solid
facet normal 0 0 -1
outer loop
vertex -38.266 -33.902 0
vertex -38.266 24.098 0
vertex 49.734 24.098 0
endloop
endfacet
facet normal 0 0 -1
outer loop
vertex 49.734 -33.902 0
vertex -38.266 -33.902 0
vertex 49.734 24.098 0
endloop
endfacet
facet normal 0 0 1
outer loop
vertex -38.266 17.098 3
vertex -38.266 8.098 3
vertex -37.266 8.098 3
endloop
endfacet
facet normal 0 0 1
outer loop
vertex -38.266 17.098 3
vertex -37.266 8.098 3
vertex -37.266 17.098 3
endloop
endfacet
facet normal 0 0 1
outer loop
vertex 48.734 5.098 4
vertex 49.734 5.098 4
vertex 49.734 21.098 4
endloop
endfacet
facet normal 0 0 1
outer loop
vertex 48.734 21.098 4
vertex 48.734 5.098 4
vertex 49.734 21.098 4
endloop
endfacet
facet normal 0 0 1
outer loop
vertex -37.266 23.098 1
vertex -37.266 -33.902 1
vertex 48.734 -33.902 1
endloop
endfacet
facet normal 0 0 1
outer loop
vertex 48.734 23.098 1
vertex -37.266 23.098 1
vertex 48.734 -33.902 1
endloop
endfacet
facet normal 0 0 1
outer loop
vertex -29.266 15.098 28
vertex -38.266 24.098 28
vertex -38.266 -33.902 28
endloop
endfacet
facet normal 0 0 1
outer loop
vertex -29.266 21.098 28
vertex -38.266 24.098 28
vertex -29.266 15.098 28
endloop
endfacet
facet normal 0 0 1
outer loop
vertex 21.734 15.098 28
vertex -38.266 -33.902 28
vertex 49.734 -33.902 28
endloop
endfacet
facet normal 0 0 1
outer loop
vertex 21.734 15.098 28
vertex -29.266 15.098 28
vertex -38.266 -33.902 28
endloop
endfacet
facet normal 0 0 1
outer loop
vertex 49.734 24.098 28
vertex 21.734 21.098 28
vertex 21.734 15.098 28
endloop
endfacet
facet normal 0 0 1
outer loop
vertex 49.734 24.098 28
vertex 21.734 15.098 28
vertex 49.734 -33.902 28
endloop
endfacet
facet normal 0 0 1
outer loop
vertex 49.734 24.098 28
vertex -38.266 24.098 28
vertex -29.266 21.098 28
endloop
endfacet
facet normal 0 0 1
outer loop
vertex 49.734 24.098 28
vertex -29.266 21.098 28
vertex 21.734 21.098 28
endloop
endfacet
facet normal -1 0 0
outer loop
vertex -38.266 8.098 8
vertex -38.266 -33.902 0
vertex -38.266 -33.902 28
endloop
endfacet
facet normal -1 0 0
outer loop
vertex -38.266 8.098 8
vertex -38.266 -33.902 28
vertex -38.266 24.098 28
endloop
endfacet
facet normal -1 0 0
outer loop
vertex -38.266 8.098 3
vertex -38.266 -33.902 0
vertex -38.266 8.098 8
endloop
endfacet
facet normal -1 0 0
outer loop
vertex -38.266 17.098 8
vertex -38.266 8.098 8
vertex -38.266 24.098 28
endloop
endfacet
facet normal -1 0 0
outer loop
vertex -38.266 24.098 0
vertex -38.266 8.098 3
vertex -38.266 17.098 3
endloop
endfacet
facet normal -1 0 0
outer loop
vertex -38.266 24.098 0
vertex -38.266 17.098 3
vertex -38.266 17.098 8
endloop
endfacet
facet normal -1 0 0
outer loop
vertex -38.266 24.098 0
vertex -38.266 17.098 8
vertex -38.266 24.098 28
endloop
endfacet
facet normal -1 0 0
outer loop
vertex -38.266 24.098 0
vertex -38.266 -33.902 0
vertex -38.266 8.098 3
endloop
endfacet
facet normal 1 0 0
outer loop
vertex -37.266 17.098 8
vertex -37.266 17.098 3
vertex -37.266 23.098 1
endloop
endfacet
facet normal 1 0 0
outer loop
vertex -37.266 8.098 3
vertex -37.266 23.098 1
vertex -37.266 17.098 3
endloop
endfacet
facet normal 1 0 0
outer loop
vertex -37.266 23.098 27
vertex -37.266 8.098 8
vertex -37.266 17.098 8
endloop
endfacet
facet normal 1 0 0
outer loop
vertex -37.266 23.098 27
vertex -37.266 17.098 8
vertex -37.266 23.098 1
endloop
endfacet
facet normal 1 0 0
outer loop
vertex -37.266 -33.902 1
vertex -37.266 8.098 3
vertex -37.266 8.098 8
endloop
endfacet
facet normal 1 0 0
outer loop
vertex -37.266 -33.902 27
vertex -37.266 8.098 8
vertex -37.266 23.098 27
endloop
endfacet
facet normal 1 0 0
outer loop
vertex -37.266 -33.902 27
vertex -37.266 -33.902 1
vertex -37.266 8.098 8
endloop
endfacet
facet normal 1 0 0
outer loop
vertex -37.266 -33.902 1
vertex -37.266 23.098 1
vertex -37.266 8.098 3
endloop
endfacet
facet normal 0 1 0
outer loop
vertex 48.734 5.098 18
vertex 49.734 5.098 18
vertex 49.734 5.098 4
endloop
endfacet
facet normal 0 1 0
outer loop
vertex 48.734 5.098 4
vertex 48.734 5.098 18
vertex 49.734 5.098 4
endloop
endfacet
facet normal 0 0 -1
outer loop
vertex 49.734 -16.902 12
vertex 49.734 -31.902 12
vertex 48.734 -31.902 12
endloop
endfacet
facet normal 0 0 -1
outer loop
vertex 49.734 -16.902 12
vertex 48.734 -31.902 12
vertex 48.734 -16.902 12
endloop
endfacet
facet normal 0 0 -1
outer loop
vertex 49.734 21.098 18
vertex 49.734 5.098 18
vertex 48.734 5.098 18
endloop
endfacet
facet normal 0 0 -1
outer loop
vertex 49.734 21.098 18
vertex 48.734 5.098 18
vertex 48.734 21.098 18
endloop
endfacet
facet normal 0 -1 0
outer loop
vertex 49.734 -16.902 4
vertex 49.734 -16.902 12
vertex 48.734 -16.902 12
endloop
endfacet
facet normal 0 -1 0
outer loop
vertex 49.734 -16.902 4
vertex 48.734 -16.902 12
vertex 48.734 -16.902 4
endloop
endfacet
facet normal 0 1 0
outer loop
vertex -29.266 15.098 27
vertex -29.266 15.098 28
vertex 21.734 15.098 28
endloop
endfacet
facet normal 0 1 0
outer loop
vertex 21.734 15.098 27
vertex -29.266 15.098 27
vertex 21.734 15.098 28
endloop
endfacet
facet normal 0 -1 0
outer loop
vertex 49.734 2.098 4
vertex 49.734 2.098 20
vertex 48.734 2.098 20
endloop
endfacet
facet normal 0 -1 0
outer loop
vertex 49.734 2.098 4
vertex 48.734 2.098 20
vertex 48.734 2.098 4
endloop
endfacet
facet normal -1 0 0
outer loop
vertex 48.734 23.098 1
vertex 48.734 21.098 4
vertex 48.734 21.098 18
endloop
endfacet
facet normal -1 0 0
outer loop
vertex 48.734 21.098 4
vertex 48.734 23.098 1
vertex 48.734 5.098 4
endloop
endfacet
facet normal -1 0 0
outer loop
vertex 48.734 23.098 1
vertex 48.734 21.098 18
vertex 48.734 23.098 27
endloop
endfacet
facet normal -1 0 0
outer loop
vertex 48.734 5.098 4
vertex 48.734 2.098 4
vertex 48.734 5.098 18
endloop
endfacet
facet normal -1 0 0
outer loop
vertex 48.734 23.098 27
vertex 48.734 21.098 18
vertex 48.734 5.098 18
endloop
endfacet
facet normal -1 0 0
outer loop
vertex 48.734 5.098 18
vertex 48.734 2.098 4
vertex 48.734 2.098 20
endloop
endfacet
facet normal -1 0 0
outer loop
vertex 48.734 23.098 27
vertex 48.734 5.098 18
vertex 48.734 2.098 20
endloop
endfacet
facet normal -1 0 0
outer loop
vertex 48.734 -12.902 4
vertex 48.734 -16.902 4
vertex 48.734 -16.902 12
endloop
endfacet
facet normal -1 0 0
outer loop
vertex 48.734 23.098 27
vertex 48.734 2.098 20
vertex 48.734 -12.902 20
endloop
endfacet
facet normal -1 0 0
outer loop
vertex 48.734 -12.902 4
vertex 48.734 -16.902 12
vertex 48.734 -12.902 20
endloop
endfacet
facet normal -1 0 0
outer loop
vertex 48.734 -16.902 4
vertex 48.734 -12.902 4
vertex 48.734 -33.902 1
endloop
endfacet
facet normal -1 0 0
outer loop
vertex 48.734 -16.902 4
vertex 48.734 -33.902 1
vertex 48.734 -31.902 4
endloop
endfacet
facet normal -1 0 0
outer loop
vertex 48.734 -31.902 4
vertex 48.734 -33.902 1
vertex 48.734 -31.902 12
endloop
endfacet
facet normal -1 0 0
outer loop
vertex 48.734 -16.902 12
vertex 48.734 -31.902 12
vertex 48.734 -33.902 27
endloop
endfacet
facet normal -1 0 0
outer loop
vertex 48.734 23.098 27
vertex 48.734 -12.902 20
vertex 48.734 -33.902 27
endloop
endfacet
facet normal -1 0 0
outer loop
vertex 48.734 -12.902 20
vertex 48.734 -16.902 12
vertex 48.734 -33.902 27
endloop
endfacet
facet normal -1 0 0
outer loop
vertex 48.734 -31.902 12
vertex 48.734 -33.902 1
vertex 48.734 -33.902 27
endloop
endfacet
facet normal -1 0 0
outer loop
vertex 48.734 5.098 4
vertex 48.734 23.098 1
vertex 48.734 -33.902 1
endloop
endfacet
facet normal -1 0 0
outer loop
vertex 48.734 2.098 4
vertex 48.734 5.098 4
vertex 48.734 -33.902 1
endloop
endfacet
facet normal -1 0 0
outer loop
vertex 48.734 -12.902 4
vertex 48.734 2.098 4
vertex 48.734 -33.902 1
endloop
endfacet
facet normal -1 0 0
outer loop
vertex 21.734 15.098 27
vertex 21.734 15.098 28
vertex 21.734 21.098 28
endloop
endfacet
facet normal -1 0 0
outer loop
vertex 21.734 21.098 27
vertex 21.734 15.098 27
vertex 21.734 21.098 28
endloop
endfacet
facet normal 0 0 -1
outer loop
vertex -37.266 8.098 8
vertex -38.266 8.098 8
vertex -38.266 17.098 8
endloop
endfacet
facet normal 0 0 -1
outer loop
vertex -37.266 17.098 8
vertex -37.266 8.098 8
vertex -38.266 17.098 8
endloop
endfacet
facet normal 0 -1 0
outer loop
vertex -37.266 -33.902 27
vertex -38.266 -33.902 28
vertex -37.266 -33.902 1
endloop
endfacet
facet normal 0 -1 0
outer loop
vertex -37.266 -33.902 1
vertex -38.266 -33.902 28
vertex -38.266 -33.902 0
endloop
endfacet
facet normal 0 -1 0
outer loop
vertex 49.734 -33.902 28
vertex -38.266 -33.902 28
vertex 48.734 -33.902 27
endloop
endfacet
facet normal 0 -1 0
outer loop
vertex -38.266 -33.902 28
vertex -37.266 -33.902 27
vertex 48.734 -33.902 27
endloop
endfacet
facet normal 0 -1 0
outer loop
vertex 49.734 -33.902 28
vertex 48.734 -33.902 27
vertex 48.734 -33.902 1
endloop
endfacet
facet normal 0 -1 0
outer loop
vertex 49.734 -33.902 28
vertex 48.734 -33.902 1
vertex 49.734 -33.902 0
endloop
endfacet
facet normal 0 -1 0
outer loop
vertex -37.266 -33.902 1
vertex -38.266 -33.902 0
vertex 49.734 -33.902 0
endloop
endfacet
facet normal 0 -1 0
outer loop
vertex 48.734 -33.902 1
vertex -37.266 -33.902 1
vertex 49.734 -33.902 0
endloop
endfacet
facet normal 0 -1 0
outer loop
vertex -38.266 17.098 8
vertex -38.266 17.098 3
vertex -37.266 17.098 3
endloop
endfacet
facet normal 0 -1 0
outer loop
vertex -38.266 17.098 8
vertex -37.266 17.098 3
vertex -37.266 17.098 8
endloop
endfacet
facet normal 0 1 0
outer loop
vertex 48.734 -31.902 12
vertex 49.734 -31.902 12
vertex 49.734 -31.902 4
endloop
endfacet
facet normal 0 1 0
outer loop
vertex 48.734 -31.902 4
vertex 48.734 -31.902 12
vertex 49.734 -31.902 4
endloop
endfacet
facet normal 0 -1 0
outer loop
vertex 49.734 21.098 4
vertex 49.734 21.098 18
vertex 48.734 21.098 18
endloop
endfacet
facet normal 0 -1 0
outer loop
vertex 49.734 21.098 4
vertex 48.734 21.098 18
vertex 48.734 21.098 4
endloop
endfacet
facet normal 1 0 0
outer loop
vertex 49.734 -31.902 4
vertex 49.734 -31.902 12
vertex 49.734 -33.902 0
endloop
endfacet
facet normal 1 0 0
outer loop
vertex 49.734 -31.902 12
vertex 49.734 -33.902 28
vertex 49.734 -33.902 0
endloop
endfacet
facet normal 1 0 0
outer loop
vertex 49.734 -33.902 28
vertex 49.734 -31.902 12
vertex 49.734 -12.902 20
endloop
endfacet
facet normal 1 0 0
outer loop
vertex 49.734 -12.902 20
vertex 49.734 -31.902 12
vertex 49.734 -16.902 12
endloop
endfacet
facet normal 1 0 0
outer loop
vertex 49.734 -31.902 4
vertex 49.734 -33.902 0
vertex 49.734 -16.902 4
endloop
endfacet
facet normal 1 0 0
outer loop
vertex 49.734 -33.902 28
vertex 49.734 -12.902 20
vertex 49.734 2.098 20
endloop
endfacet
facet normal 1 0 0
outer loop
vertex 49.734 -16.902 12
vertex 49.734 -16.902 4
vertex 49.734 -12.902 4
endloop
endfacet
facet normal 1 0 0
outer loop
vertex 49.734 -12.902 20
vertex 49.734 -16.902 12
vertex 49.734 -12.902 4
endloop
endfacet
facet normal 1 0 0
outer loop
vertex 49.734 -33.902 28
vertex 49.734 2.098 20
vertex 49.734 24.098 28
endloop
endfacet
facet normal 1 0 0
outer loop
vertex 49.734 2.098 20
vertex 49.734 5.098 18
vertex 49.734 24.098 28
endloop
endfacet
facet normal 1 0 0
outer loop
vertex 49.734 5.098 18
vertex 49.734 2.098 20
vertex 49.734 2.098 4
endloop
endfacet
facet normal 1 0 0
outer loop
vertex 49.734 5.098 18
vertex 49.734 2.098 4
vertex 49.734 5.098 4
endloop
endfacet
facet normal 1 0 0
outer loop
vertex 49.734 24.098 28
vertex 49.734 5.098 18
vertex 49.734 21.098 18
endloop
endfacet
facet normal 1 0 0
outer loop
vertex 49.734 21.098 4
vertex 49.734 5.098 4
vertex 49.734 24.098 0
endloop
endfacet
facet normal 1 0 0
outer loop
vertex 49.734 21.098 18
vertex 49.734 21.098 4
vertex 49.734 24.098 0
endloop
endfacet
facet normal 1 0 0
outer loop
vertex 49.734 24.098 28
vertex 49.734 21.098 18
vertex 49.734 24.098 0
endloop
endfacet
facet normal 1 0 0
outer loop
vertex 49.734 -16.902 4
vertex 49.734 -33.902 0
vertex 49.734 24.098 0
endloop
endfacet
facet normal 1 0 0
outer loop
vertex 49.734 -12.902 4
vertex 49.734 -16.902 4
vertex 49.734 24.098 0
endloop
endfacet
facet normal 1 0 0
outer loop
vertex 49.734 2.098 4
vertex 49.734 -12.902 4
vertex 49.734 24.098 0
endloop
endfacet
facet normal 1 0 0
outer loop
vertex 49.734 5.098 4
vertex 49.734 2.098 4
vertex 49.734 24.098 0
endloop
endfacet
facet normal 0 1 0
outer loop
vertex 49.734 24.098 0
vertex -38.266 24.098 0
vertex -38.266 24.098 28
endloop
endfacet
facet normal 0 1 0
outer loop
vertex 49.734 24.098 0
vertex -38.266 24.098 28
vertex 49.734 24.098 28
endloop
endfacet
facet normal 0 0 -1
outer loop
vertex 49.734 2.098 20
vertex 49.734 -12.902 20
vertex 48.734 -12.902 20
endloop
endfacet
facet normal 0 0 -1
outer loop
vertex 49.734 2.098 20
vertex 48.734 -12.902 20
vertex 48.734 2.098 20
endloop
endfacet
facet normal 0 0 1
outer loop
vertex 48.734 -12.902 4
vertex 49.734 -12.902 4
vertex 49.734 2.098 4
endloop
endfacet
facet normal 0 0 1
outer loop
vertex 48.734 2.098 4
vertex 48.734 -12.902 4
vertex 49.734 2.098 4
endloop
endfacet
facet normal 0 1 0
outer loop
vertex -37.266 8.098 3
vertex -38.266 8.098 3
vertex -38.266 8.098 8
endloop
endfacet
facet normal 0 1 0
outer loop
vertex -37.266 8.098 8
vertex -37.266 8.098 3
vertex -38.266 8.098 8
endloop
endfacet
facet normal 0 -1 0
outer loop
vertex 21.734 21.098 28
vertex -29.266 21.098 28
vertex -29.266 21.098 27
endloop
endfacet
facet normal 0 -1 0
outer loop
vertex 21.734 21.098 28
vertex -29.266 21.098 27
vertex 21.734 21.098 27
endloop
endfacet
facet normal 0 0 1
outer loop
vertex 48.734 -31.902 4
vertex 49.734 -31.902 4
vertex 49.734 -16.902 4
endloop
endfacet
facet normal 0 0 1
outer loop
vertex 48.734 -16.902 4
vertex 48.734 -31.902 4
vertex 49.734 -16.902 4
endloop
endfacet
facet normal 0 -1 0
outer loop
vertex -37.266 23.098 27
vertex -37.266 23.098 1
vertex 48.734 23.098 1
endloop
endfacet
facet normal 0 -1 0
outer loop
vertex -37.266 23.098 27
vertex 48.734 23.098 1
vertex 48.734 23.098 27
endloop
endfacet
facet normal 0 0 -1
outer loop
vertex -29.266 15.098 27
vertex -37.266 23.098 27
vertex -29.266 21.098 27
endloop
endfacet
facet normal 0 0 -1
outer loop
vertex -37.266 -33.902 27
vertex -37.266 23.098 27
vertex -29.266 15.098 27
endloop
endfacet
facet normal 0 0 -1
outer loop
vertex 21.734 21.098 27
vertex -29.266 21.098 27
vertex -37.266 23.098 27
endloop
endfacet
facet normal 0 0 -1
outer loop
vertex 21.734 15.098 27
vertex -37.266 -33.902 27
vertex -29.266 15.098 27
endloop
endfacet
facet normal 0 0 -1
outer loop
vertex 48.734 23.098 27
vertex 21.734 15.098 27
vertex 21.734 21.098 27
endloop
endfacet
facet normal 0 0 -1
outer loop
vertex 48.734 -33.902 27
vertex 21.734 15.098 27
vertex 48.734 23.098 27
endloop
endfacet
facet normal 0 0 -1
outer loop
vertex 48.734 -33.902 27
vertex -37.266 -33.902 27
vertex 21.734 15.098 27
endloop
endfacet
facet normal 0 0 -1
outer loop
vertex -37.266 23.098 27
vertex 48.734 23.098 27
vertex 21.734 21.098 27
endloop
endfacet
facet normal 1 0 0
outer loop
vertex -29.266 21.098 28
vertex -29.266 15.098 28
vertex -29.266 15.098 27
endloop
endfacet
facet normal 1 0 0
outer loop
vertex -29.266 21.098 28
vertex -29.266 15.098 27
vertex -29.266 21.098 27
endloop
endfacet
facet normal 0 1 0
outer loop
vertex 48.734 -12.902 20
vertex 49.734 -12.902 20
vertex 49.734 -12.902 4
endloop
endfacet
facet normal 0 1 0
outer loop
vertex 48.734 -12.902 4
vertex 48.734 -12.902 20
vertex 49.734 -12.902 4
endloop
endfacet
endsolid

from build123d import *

# Parameters (mm, degrees)
SKETCH_1_W          = 88
SKETCH_1_H          = 58
EXTRUDE_1_DEPTH     = 28
SKETCH_2_W          = 26
SKETCH_2_H          = 56
CUT_EXTRUDE_1_DEPTH = 87
SKETCH_3_W          = 8
SKETCH_3_H          = 15
SKETCH_3_W_2        = 16
SKETCH_3_W_3        = 14
SKETCH_3_H_2        = 16
CUT_EXTRUDE_2_DEPTH = 87
SKETCH_4_W          = 28
SKETCH_4_H          = 58
EXTRUDE_2_DEPTH     = 1
SKETCH_6_W          = 51
SKETCH_6_H          = 6
CUT_EXTRUDE_4_DEPTH = 10
SKETCH_7_W          = 5
SKETCH_7_H          = 9
CUT_EXTRUDE_5_DEPTH = 10
SKETCH_8_W          = 86
SKETCH_8_H          = 26
CUT_EXTRUDE_6_DEPTH = 57


with BuildPart() as part:
    # 草图1 → 凸台-拉伸1 (new body)
    with BuildSketch(Plane.XY):
        with Locations((5.73433584, -4.901711192)):
            Rectangle(SKETCH_1_W, SKETCH_1_H)
    extrude(amount=EXTRUDE_1_DEPTH)

    # 草图2 → 切除-拉伸1 (cut)
    with BuildSketch(Plane.ZY.offset(38.26566416)):
        with Locations((14, -4.901711192)):
            Rectangle(SKETCH_2_W, SKETCH_2_H)
    extrude(amount=-CUT_EXTRUDE_1_DEPTH, mode=Mode.SUBTRACT)

    # 草图3 → 切除-拉伸2 (cut)
    with BuildSketch(Plane(origin=(49.73433584, 0, 0), x_dir=(0, 0, -1), z_dir=(1, 0, 0))):
        with Locations((-8, -24.401711192)):
            Rectangle(SKETCH_3_W, SKETCH_3_H)
        with Locations((-12, -5.401711192)):
            Rectangle(SKETCH_3_W_2, SKETCH_3_H)
        with Locations((-11, 13.098288808)):
            Rectangle(SKETCH_3_W_3, SKETCH_3_H_2)
    extrude(amount=-CUT_EXTRUDE_2_DEPTH, mode=Mode.SUBTRACT)

    # 草图4 → 凸台-拉伸2 (add)
    with BuildSketch(Plane.ZY.offset(38.26566416)):
        with Locations((14, -4.901711192)):
            Rectangle(SKETCH_4_W, SKETCH_4_H)
    extrude(amount=-EXTRUDE_2_DEPTH)

    # 草图6 → 切除-拉伸4 (cut)
    with BuildSketch(Plane.XY.offset(28)):
        with Locations((-3.76566416, 18.098288808)):
            Rectangle(SKETCH_6_W, SKETCH_6_H)
    extrude(amount=-CUT_EXTRUDE_4_DEPTH, mode=Mode.SUBTRACT)

    # 草图7 → 切除-拉伸5 (cut)
    with BuildSketch(Plane.ZY.offset(38.26566416)):
        with Locations((5.5, 12.598288808)):
            Rectangle(SKETCH_7_W, SKETCH_7_H)
    extrude(amount=-CUT_EXTRUDE_5_DEPTH, mode=Mode.SUBTRACT)

    # 草图8 → 切除-拉伸6 (cut)
    with BuildSketch(Plane.XZ.offset(33.901711192)):
        with Locations((5.73433584, 14)):
            Rectangle(SKETCH_8_W, SKETCH_8_H)
    extrude(amount=-CUT_EXTRUDE_6_DEPTH, mode=Mode.SUBTRACT)


solid = part.part
